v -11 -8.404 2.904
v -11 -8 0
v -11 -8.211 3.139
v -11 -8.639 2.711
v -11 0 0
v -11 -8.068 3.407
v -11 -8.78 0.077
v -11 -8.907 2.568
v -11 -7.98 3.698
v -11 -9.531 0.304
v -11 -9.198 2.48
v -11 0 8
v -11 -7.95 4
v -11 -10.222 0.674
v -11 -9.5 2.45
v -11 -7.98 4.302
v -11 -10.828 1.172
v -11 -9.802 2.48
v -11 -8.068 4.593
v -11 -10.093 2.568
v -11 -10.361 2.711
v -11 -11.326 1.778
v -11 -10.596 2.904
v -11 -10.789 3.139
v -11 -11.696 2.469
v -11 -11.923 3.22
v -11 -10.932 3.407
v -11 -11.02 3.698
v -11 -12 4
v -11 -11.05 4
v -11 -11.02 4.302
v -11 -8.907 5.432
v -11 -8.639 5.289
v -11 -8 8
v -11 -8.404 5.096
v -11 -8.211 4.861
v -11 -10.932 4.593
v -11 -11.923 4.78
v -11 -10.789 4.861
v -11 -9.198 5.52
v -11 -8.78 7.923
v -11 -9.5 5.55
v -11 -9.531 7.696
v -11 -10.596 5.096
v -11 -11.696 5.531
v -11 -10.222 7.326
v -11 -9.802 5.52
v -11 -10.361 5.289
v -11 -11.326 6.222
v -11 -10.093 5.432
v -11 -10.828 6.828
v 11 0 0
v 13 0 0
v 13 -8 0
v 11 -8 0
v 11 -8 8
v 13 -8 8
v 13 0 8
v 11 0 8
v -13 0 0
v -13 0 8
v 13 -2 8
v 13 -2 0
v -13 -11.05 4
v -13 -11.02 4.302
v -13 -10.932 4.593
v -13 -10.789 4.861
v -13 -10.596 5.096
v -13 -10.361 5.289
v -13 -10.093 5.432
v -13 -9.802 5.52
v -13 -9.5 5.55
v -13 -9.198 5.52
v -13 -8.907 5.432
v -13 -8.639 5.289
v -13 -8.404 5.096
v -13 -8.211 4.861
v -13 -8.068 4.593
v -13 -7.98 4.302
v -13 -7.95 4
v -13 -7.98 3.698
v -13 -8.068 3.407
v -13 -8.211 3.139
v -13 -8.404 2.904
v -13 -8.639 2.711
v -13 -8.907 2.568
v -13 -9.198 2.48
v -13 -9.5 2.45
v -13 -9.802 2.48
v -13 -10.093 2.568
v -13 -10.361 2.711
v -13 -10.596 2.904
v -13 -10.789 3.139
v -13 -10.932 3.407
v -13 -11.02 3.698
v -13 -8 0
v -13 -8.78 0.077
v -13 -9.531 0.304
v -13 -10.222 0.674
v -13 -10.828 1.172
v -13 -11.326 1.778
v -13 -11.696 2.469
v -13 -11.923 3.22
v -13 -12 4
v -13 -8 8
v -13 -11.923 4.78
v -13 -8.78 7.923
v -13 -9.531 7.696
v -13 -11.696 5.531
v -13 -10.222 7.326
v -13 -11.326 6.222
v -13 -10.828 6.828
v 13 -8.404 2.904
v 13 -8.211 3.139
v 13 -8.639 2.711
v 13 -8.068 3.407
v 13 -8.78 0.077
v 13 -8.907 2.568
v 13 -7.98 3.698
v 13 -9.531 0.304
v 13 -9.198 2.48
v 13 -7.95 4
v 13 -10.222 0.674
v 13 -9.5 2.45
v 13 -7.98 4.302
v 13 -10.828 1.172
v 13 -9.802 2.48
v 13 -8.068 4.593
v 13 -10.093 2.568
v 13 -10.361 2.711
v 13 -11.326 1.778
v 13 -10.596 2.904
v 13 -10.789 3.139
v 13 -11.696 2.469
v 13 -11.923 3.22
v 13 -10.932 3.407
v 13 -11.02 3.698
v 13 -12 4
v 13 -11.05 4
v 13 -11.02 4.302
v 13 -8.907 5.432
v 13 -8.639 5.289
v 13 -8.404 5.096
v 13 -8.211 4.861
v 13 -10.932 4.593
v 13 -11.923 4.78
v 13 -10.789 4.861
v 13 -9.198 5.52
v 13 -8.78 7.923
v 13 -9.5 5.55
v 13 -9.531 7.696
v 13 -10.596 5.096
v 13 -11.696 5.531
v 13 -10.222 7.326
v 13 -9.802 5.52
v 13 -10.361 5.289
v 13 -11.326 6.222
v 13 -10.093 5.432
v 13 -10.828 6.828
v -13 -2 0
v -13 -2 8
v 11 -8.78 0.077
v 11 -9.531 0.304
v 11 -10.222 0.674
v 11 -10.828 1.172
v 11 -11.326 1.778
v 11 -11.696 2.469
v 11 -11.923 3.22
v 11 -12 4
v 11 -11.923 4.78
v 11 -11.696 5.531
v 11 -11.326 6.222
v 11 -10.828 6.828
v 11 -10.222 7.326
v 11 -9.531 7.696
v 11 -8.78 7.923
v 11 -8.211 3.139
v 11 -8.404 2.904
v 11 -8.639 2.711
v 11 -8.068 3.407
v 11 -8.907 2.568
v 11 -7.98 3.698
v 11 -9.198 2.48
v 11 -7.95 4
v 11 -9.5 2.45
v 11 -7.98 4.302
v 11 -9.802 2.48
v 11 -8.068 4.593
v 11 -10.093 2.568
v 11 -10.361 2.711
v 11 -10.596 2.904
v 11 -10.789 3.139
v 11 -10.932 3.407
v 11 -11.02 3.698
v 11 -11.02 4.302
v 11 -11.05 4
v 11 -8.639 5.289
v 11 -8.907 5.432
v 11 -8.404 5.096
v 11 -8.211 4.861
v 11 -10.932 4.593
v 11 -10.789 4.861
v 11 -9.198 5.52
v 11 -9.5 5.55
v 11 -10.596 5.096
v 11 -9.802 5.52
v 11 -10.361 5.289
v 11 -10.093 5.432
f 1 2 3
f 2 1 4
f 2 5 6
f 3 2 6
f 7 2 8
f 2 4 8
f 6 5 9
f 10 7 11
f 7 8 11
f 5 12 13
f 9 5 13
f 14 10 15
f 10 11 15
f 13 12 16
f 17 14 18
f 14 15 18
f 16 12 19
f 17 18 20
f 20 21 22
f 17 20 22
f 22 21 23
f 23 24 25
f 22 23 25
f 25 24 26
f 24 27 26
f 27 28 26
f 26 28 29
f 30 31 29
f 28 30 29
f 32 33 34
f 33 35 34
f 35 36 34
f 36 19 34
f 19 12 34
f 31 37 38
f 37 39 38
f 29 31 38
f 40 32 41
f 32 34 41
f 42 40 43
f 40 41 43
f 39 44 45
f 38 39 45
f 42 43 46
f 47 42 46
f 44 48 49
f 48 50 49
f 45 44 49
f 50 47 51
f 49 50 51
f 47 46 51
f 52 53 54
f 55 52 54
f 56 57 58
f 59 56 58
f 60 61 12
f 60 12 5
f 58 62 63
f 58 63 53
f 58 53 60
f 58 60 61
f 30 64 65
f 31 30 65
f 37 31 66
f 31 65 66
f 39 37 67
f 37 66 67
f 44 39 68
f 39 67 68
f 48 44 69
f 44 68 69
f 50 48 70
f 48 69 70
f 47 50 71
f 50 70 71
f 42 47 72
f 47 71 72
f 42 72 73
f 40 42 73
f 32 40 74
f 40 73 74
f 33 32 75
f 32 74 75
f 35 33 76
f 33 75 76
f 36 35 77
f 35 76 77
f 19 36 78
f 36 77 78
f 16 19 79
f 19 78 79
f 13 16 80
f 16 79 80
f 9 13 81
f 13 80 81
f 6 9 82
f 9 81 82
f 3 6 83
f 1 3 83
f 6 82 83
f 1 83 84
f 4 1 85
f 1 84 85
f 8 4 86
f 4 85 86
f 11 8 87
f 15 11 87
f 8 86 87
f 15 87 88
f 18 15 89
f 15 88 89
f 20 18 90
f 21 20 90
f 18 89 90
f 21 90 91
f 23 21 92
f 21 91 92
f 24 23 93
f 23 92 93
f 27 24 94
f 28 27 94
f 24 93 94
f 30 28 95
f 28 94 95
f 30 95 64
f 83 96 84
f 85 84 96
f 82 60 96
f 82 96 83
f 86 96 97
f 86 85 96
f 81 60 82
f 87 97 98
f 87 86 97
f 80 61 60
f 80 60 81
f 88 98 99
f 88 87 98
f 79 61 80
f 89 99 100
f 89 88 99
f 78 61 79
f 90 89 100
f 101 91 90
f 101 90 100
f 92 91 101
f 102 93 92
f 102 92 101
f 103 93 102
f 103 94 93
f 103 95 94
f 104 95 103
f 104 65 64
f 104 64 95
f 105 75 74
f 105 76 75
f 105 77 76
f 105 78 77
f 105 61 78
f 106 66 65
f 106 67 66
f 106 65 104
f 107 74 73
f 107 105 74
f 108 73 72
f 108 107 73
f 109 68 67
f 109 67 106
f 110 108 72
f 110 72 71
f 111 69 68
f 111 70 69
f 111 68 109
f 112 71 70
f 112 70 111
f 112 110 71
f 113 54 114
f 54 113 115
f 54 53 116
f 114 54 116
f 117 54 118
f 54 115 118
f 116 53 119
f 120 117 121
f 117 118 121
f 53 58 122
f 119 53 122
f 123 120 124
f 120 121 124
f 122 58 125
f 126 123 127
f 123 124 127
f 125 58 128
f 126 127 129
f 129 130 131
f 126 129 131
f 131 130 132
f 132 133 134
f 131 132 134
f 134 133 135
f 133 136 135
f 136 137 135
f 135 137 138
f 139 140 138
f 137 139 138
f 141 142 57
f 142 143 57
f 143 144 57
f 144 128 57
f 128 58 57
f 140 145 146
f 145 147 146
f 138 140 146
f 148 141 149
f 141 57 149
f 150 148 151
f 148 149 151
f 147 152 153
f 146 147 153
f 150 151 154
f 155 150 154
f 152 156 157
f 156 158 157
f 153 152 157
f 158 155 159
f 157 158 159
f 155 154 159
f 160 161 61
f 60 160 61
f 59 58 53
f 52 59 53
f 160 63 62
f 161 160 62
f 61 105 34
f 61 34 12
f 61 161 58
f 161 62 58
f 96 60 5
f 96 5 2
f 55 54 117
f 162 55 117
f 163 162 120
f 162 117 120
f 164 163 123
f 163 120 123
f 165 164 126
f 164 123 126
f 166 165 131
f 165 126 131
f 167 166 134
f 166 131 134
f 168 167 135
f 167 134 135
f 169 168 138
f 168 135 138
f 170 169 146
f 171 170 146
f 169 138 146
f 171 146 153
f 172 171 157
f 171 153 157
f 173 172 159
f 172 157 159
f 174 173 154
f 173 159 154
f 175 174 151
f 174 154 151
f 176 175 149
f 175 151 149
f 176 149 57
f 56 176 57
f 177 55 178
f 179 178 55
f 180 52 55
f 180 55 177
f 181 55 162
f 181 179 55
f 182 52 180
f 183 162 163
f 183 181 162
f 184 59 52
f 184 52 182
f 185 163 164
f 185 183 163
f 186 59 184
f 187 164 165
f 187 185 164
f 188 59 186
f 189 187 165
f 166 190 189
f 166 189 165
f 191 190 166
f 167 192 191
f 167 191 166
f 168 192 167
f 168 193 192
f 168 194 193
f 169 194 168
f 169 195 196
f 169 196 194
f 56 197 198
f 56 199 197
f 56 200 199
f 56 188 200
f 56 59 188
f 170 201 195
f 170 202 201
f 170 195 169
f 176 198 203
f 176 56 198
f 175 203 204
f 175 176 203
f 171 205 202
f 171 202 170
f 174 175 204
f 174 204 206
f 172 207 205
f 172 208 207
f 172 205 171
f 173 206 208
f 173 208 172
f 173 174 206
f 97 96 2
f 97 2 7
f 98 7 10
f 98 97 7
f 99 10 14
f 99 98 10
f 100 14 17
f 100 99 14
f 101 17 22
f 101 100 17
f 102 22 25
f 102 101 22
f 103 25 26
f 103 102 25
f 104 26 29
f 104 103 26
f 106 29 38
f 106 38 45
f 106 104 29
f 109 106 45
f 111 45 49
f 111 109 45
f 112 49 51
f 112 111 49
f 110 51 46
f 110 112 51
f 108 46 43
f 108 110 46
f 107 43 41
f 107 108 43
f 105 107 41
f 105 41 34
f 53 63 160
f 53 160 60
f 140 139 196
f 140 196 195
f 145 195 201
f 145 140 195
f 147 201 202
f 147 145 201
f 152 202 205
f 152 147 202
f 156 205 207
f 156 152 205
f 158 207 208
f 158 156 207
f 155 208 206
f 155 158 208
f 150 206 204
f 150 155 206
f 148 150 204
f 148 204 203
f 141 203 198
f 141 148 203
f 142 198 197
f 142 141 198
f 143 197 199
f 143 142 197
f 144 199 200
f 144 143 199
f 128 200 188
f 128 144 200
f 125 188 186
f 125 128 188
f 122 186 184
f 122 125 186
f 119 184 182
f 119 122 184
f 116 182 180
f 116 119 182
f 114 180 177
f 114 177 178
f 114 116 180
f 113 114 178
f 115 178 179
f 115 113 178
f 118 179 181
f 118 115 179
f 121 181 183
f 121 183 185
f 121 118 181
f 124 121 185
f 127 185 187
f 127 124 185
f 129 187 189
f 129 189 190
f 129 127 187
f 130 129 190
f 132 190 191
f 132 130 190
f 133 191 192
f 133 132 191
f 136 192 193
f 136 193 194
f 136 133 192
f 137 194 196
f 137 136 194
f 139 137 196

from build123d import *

# Parameters (mm, degrees)
F0_W     = 2
F0_H     = 8
F1_DEPTH = 13
F2_R     = 1.55
F3_DEPTH = 2


with BuildPart() as f1:
    # F0 (on Right) → F1 (new body, symmetric)
    with BuildSketch(Plane.YZ):
        with Locations((-1, 4)):
            Rectangle(F0_W, F0_H)
    extrude(amount=F1_DEPTH, both=True)


with BuildPart() as f3:
    # F2 (on face) → F3 (new body)
    with BuildSketch(Plane(origin=(-13, 0, 0), x_dir=(0, -1, 0), z_dir=(-1, 0, 0))):
        with BuildLine():
            Line((8, 8), (0, 8))
            Line((0, 8), (0, 0))
            Line((0, 0), (8, 0))
            ThreePointArc((8, 0), (12, 4), (8, 8))
        make_face()
        with Locations((9.5, 4)):
            Circle(F2_R, mode=Mode.SUBTRACT)
    extrude(amount=-F3_DEPTH)


with BuildPart() as f4_1:
    # F4: instance of F3
    add(f3.part.mirror(Plane.YZ))


solid = Compound([f1.part, f3.part, f4_1.part])
